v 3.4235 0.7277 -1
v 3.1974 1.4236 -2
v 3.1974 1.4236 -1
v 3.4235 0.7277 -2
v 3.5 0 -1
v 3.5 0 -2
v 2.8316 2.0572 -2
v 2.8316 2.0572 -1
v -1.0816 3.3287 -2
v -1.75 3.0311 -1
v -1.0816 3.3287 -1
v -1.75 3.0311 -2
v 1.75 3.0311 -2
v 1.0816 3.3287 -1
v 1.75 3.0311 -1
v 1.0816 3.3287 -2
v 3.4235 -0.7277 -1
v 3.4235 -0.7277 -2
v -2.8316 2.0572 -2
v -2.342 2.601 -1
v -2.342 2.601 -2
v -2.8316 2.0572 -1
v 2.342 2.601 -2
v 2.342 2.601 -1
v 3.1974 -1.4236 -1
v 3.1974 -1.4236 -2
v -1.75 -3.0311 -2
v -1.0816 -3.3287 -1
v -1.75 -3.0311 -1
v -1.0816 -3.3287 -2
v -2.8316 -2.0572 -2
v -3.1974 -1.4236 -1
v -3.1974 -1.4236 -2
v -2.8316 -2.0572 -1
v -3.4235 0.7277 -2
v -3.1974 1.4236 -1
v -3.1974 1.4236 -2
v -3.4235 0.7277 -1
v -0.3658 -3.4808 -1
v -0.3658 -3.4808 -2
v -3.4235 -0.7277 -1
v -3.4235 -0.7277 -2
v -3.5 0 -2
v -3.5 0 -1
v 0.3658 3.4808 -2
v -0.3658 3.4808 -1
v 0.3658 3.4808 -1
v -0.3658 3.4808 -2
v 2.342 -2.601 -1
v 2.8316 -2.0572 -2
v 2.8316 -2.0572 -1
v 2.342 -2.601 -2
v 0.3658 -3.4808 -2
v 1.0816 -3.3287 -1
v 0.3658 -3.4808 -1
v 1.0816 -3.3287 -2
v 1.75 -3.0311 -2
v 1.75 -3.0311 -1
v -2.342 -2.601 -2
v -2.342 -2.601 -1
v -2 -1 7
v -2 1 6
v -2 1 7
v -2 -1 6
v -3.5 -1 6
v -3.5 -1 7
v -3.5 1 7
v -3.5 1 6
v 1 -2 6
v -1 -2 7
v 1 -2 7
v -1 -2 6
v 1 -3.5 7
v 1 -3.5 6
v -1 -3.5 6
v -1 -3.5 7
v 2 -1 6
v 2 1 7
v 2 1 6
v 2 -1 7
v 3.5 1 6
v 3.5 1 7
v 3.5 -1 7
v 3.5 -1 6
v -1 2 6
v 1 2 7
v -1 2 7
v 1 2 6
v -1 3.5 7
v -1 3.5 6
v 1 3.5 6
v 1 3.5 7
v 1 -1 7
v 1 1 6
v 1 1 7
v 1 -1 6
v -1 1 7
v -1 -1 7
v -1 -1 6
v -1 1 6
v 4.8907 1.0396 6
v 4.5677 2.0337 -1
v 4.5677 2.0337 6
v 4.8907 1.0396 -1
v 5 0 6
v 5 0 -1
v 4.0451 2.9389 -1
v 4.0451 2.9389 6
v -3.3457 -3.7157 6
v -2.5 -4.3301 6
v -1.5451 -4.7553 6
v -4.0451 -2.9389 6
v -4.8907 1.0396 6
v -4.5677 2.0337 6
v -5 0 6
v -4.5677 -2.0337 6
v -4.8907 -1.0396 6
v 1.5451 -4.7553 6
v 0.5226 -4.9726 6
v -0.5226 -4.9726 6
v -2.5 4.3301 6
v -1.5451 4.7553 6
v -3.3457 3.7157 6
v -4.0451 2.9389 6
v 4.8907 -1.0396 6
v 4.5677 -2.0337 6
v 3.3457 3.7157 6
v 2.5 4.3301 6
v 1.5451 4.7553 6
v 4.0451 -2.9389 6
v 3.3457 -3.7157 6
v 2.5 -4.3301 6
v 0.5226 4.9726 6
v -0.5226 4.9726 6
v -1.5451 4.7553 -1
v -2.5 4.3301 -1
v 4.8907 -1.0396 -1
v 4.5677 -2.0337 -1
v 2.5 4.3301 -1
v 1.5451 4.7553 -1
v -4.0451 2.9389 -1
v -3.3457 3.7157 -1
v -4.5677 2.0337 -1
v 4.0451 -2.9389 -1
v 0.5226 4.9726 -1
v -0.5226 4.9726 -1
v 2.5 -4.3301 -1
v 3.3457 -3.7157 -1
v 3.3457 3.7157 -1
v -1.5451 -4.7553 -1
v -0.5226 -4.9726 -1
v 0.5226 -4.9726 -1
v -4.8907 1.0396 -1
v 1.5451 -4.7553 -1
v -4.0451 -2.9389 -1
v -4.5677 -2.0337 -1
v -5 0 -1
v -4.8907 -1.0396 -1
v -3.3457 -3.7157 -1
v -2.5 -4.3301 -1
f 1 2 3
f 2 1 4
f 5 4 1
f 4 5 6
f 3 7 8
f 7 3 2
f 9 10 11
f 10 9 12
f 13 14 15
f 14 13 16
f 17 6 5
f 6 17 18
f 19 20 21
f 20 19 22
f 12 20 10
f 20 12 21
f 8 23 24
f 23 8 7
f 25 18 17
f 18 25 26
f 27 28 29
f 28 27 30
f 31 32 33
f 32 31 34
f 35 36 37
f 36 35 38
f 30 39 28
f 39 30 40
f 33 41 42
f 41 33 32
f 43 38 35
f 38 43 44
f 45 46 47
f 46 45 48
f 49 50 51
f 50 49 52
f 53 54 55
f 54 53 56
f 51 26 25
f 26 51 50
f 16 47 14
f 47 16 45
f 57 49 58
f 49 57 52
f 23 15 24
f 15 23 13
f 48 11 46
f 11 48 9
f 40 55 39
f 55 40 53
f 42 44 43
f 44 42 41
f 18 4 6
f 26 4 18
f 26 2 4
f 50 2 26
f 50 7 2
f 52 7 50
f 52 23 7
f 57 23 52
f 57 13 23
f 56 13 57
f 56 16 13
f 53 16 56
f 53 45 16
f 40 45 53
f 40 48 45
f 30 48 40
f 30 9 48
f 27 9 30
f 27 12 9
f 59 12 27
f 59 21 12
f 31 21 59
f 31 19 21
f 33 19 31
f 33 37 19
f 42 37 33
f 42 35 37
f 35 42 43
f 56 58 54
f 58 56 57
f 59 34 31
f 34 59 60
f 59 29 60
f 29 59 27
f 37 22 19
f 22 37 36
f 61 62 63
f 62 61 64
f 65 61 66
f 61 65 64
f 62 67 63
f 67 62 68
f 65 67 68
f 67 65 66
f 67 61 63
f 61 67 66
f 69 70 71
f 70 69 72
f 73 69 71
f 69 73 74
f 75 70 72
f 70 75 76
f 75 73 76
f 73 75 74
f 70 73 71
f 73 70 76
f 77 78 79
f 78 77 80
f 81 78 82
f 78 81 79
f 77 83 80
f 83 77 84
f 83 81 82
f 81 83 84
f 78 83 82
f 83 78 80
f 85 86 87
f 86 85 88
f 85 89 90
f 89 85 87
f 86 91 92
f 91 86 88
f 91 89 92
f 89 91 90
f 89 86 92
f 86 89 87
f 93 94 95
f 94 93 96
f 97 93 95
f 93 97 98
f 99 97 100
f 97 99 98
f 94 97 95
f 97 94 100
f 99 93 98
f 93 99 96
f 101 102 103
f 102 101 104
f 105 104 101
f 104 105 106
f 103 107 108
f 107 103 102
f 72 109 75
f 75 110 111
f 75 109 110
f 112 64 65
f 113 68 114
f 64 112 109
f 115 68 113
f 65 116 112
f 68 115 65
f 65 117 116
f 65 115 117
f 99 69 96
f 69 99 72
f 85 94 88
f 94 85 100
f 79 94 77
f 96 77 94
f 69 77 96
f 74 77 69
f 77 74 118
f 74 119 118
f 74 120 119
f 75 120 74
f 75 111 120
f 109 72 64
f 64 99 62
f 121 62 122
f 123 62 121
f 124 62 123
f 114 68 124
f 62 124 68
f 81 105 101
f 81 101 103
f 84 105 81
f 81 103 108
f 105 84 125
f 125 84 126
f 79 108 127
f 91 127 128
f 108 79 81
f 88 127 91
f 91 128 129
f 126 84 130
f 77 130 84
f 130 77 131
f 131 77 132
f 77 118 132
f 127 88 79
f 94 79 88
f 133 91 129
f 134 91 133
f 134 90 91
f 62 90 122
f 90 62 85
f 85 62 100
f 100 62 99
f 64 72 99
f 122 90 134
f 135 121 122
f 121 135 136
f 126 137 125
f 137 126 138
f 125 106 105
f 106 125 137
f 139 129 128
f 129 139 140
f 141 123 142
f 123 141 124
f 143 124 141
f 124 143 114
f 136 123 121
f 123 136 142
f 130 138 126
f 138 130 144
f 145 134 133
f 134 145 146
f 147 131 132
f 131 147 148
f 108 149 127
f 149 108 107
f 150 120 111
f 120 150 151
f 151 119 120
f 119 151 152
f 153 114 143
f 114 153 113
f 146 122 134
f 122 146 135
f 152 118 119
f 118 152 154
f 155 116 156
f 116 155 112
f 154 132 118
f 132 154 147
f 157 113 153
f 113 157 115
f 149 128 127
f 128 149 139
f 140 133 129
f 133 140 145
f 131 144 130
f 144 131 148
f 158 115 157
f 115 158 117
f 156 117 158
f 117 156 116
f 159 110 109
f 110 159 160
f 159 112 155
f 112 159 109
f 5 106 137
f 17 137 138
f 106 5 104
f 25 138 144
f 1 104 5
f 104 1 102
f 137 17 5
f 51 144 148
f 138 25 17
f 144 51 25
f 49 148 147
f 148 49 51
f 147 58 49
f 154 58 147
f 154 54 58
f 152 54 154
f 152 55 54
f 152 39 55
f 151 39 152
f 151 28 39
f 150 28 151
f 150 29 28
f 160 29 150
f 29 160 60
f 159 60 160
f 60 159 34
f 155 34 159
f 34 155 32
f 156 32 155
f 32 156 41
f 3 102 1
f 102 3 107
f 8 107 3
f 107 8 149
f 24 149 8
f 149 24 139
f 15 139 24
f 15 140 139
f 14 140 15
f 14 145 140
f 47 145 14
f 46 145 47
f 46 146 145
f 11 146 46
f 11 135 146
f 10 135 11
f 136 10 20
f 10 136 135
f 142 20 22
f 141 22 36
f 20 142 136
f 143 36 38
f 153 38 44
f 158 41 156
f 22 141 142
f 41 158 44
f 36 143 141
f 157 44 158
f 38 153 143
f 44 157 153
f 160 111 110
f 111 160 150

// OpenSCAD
$fs=0.5;

color("darkorange",0.5) button_dock();
color("springgreen") button_clips();
color("red",0.5) button_clip_cavity();

//dock measurements
top_height = 1.8;
shaft_height = 1.4;
dock_height = top_height + shaft_height;
hole_radius = 0.8;
hole_depth = 1;
base_radius = 3.5;
module button_dock(){
	difference(){
		union(){
			translate([-2,-2,shaft_height])
				cube([4,4,top_height]);
			translate([-1.5,-1.5,0])
				cube([3,3,dock_height]);
			translate([0,0,-2])
				cylinder(h=2, r=base_radius);
		}
		translate([0,0,dock_height-hole_depth+0.1]) 
			cylinder(h=hole_depth, r=hole_radius);
	}
}

clip_width = 2;
clip_thick = 1.5;
clip_height = 7;
module button_clip(){
	translate([-(2+clip_thick),clip_width/2,0])
	rotate([90,0,0])
	union(){
		cube([clip_thick ,clip_height, clip_width]);
		linear_extrude(height=clip_width)
		polygon(
			points=[
				[0,0],
				[0,shaft_height],
				[clip_thick+0.5, shaft_height],
				[clip_thick,0]
			],
			paths=[
				[0,1,2,3]
			]
		);
	}
}

module middle_pin(){
	translate([-1,-1,dock_height+0.2]) cube([2,2,clip_height-dock_height-0.2]);
	translate([0,0,dock_height-hole_depth+0.2]) cylinder(h=hole_depth+0.2, r=hole_radius-0.1);
}

module button_clips(){
	rotate([0,0,0]) button_clip();
	rotate([0,0,90]) button_clip();
	rotate([0,0,180]) button_clip();
	rotate([0,0,270]) button_clip();
	middle_pin();
}

module button_clip_cavity(){
	translate([0,0,-1]) cylinder(h=clip_height, r=5);
}
